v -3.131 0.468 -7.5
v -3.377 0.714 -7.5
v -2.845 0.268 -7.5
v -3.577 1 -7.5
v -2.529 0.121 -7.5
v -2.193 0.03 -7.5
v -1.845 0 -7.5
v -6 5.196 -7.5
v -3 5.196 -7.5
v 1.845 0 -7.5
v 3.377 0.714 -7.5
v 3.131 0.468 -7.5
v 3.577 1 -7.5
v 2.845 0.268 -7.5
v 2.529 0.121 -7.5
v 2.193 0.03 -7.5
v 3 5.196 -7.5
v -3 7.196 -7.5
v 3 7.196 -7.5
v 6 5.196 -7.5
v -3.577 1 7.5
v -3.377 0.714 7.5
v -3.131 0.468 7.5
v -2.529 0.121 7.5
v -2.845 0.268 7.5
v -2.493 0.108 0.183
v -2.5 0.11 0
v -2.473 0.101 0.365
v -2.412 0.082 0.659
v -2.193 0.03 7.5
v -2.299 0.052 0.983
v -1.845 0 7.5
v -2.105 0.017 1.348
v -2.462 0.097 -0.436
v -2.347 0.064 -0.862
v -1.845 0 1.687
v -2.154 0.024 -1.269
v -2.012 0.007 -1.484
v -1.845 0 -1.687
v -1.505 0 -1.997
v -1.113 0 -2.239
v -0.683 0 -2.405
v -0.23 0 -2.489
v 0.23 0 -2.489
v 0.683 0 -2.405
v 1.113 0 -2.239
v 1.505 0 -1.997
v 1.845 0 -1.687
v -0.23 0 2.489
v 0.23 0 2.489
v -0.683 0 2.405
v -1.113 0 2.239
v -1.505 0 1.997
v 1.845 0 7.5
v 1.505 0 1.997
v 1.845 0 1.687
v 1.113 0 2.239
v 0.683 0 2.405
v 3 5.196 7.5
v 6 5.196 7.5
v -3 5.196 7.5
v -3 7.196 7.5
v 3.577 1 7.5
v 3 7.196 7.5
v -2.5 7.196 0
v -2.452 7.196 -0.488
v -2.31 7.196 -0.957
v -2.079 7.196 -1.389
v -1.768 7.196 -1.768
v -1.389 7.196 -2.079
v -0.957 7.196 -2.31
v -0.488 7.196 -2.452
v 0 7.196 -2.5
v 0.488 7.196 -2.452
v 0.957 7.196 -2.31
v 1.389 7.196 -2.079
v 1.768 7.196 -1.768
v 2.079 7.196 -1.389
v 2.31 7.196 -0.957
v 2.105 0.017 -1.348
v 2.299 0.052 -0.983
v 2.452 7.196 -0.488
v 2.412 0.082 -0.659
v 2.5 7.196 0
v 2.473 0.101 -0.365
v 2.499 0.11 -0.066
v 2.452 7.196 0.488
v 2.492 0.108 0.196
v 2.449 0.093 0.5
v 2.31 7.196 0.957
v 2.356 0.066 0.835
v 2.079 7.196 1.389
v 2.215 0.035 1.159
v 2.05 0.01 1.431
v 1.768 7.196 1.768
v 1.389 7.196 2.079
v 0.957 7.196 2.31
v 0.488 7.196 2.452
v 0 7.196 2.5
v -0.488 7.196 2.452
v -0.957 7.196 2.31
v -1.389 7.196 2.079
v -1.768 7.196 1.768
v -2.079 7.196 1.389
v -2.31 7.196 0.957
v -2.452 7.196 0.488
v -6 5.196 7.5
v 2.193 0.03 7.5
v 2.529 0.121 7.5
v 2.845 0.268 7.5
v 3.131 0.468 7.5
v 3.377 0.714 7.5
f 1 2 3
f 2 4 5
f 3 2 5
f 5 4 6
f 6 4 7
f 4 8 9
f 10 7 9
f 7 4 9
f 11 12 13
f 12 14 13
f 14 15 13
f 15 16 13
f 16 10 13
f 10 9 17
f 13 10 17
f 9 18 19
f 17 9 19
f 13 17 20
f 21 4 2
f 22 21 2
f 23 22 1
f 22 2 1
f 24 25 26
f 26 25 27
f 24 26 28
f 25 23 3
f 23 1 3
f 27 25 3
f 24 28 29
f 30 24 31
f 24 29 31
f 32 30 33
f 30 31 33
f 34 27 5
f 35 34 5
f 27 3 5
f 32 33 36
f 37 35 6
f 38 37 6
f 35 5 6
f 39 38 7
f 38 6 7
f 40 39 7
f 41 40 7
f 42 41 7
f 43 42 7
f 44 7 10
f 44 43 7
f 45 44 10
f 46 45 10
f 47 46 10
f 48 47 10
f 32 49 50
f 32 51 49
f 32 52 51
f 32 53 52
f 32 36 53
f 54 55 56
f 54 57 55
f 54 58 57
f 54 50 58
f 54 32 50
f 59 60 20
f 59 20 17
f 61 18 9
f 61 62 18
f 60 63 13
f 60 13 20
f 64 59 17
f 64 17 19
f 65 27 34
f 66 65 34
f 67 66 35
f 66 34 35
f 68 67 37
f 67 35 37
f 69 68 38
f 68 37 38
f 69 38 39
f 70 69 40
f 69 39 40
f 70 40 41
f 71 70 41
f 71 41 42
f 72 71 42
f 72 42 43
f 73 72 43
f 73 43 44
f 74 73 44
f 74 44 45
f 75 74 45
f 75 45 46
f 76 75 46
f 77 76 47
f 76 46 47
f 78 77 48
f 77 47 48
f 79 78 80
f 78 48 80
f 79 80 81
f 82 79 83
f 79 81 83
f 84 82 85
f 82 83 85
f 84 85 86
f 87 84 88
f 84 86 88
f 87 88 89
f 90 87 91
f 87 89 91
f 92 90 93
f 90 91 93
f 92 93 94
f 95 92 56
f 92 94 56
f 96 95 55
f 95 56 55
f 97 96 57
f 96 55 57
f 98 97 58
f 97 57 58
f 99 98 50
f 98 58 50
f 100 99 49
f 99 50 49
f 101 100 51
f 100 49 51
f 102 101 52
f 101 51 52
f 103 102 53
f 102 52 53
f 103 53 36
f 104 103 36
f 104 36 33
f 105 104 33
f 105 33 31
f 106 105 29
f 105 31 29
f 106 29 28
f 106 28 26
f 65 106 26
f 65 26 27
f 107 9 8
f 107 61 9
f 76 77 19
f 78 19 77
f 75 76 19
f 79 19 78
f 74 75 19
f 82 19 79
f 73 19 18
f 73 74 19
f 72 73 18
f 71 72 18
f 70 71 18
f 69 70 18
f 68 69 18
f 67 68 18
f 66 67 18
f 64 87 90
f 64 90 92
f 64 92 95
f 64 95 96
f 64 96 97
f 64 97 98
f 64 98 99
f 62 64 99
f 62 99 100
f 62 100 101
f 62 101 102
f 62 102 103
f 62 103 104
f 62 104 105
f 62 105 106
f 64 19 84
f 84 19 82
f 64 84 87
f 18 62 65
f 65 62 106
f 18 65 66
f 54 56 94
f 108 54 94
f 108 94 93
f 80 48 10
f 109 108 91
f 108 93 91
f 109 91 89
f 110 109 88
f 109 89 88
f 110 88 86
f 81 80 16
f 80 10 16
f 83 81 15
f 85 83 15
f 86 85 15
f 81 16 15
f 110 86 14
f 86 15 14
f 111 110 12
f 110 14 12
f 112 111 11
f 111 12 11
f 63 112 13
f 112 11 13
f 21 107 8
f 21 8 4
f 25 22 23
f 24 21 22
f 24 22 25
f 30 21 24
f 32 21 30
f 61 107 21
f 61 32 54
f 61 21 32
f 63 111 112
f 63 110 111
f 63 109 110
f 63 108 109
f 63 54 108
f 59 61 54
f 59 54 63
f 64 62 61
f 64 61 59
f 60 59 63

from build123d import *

# Parameters (mm, degrees)
BOSS_EXTRUDE1_DEPTH = 7.5
M6_TAPPED_HOLE1_D   = 5
FILLET1_R           = 2


with BuildPart() as part:
    # Sketch2 → Boss-Extrude1 (new, symmetric)
    with BuildSketch(Plane.XY):
        Polygon((-6, 5.196152423), (-3, 0), (3, 0), (6, 5.196152423), (3, 5.196152423), (3, 7.196152423), (-3, 7.196152423), (-3, 5.196152423), align=None)
    extrude(amount=BOSS_EXTRUDE1_DEPTH, both=True)

    # M6 Tapped Hole1 (through all)
    with Locations(Plane(origin=(0, 7.196152423, 0), x_dir=(1, 0, 0), z_dir=(0, 1, 0))):
        with Locations((0, 0)):
            Hole(M6_TAPPED_HOLE1_D / 2)

    # Fillet1
    # the kernel refuses this fillet: 2 mm, written as the material it takes off along each edge
    with BuildSketch(Plane(origin=(3, 0, -10.386751346), x_dir=(-1, 0, 0), z_dir=(0, 0, 1)), Plane(origin=(-3, 0, -10.386751346), x_dir=(-0.5000000000000046, 0.866025403784436, 0), z_dir=(0, 0, 1))) as fillet1_piece_1:
        with BuildLine():
            CenterArc((FILLET1_R * 0.57735026919, -FILLET1_R), FILLET1_R, 90, 60)
            Line((-FILLET1_R * 0.288675134595, -FILLET1_R * 0.5), (0, 0))
            Line((0, 0), (FILLET1_R * 0.57735026919, 0))
        make_face()
    extrude(amount=20.773502692, mode=Mode.SUBTRACT)


solid = part.part
